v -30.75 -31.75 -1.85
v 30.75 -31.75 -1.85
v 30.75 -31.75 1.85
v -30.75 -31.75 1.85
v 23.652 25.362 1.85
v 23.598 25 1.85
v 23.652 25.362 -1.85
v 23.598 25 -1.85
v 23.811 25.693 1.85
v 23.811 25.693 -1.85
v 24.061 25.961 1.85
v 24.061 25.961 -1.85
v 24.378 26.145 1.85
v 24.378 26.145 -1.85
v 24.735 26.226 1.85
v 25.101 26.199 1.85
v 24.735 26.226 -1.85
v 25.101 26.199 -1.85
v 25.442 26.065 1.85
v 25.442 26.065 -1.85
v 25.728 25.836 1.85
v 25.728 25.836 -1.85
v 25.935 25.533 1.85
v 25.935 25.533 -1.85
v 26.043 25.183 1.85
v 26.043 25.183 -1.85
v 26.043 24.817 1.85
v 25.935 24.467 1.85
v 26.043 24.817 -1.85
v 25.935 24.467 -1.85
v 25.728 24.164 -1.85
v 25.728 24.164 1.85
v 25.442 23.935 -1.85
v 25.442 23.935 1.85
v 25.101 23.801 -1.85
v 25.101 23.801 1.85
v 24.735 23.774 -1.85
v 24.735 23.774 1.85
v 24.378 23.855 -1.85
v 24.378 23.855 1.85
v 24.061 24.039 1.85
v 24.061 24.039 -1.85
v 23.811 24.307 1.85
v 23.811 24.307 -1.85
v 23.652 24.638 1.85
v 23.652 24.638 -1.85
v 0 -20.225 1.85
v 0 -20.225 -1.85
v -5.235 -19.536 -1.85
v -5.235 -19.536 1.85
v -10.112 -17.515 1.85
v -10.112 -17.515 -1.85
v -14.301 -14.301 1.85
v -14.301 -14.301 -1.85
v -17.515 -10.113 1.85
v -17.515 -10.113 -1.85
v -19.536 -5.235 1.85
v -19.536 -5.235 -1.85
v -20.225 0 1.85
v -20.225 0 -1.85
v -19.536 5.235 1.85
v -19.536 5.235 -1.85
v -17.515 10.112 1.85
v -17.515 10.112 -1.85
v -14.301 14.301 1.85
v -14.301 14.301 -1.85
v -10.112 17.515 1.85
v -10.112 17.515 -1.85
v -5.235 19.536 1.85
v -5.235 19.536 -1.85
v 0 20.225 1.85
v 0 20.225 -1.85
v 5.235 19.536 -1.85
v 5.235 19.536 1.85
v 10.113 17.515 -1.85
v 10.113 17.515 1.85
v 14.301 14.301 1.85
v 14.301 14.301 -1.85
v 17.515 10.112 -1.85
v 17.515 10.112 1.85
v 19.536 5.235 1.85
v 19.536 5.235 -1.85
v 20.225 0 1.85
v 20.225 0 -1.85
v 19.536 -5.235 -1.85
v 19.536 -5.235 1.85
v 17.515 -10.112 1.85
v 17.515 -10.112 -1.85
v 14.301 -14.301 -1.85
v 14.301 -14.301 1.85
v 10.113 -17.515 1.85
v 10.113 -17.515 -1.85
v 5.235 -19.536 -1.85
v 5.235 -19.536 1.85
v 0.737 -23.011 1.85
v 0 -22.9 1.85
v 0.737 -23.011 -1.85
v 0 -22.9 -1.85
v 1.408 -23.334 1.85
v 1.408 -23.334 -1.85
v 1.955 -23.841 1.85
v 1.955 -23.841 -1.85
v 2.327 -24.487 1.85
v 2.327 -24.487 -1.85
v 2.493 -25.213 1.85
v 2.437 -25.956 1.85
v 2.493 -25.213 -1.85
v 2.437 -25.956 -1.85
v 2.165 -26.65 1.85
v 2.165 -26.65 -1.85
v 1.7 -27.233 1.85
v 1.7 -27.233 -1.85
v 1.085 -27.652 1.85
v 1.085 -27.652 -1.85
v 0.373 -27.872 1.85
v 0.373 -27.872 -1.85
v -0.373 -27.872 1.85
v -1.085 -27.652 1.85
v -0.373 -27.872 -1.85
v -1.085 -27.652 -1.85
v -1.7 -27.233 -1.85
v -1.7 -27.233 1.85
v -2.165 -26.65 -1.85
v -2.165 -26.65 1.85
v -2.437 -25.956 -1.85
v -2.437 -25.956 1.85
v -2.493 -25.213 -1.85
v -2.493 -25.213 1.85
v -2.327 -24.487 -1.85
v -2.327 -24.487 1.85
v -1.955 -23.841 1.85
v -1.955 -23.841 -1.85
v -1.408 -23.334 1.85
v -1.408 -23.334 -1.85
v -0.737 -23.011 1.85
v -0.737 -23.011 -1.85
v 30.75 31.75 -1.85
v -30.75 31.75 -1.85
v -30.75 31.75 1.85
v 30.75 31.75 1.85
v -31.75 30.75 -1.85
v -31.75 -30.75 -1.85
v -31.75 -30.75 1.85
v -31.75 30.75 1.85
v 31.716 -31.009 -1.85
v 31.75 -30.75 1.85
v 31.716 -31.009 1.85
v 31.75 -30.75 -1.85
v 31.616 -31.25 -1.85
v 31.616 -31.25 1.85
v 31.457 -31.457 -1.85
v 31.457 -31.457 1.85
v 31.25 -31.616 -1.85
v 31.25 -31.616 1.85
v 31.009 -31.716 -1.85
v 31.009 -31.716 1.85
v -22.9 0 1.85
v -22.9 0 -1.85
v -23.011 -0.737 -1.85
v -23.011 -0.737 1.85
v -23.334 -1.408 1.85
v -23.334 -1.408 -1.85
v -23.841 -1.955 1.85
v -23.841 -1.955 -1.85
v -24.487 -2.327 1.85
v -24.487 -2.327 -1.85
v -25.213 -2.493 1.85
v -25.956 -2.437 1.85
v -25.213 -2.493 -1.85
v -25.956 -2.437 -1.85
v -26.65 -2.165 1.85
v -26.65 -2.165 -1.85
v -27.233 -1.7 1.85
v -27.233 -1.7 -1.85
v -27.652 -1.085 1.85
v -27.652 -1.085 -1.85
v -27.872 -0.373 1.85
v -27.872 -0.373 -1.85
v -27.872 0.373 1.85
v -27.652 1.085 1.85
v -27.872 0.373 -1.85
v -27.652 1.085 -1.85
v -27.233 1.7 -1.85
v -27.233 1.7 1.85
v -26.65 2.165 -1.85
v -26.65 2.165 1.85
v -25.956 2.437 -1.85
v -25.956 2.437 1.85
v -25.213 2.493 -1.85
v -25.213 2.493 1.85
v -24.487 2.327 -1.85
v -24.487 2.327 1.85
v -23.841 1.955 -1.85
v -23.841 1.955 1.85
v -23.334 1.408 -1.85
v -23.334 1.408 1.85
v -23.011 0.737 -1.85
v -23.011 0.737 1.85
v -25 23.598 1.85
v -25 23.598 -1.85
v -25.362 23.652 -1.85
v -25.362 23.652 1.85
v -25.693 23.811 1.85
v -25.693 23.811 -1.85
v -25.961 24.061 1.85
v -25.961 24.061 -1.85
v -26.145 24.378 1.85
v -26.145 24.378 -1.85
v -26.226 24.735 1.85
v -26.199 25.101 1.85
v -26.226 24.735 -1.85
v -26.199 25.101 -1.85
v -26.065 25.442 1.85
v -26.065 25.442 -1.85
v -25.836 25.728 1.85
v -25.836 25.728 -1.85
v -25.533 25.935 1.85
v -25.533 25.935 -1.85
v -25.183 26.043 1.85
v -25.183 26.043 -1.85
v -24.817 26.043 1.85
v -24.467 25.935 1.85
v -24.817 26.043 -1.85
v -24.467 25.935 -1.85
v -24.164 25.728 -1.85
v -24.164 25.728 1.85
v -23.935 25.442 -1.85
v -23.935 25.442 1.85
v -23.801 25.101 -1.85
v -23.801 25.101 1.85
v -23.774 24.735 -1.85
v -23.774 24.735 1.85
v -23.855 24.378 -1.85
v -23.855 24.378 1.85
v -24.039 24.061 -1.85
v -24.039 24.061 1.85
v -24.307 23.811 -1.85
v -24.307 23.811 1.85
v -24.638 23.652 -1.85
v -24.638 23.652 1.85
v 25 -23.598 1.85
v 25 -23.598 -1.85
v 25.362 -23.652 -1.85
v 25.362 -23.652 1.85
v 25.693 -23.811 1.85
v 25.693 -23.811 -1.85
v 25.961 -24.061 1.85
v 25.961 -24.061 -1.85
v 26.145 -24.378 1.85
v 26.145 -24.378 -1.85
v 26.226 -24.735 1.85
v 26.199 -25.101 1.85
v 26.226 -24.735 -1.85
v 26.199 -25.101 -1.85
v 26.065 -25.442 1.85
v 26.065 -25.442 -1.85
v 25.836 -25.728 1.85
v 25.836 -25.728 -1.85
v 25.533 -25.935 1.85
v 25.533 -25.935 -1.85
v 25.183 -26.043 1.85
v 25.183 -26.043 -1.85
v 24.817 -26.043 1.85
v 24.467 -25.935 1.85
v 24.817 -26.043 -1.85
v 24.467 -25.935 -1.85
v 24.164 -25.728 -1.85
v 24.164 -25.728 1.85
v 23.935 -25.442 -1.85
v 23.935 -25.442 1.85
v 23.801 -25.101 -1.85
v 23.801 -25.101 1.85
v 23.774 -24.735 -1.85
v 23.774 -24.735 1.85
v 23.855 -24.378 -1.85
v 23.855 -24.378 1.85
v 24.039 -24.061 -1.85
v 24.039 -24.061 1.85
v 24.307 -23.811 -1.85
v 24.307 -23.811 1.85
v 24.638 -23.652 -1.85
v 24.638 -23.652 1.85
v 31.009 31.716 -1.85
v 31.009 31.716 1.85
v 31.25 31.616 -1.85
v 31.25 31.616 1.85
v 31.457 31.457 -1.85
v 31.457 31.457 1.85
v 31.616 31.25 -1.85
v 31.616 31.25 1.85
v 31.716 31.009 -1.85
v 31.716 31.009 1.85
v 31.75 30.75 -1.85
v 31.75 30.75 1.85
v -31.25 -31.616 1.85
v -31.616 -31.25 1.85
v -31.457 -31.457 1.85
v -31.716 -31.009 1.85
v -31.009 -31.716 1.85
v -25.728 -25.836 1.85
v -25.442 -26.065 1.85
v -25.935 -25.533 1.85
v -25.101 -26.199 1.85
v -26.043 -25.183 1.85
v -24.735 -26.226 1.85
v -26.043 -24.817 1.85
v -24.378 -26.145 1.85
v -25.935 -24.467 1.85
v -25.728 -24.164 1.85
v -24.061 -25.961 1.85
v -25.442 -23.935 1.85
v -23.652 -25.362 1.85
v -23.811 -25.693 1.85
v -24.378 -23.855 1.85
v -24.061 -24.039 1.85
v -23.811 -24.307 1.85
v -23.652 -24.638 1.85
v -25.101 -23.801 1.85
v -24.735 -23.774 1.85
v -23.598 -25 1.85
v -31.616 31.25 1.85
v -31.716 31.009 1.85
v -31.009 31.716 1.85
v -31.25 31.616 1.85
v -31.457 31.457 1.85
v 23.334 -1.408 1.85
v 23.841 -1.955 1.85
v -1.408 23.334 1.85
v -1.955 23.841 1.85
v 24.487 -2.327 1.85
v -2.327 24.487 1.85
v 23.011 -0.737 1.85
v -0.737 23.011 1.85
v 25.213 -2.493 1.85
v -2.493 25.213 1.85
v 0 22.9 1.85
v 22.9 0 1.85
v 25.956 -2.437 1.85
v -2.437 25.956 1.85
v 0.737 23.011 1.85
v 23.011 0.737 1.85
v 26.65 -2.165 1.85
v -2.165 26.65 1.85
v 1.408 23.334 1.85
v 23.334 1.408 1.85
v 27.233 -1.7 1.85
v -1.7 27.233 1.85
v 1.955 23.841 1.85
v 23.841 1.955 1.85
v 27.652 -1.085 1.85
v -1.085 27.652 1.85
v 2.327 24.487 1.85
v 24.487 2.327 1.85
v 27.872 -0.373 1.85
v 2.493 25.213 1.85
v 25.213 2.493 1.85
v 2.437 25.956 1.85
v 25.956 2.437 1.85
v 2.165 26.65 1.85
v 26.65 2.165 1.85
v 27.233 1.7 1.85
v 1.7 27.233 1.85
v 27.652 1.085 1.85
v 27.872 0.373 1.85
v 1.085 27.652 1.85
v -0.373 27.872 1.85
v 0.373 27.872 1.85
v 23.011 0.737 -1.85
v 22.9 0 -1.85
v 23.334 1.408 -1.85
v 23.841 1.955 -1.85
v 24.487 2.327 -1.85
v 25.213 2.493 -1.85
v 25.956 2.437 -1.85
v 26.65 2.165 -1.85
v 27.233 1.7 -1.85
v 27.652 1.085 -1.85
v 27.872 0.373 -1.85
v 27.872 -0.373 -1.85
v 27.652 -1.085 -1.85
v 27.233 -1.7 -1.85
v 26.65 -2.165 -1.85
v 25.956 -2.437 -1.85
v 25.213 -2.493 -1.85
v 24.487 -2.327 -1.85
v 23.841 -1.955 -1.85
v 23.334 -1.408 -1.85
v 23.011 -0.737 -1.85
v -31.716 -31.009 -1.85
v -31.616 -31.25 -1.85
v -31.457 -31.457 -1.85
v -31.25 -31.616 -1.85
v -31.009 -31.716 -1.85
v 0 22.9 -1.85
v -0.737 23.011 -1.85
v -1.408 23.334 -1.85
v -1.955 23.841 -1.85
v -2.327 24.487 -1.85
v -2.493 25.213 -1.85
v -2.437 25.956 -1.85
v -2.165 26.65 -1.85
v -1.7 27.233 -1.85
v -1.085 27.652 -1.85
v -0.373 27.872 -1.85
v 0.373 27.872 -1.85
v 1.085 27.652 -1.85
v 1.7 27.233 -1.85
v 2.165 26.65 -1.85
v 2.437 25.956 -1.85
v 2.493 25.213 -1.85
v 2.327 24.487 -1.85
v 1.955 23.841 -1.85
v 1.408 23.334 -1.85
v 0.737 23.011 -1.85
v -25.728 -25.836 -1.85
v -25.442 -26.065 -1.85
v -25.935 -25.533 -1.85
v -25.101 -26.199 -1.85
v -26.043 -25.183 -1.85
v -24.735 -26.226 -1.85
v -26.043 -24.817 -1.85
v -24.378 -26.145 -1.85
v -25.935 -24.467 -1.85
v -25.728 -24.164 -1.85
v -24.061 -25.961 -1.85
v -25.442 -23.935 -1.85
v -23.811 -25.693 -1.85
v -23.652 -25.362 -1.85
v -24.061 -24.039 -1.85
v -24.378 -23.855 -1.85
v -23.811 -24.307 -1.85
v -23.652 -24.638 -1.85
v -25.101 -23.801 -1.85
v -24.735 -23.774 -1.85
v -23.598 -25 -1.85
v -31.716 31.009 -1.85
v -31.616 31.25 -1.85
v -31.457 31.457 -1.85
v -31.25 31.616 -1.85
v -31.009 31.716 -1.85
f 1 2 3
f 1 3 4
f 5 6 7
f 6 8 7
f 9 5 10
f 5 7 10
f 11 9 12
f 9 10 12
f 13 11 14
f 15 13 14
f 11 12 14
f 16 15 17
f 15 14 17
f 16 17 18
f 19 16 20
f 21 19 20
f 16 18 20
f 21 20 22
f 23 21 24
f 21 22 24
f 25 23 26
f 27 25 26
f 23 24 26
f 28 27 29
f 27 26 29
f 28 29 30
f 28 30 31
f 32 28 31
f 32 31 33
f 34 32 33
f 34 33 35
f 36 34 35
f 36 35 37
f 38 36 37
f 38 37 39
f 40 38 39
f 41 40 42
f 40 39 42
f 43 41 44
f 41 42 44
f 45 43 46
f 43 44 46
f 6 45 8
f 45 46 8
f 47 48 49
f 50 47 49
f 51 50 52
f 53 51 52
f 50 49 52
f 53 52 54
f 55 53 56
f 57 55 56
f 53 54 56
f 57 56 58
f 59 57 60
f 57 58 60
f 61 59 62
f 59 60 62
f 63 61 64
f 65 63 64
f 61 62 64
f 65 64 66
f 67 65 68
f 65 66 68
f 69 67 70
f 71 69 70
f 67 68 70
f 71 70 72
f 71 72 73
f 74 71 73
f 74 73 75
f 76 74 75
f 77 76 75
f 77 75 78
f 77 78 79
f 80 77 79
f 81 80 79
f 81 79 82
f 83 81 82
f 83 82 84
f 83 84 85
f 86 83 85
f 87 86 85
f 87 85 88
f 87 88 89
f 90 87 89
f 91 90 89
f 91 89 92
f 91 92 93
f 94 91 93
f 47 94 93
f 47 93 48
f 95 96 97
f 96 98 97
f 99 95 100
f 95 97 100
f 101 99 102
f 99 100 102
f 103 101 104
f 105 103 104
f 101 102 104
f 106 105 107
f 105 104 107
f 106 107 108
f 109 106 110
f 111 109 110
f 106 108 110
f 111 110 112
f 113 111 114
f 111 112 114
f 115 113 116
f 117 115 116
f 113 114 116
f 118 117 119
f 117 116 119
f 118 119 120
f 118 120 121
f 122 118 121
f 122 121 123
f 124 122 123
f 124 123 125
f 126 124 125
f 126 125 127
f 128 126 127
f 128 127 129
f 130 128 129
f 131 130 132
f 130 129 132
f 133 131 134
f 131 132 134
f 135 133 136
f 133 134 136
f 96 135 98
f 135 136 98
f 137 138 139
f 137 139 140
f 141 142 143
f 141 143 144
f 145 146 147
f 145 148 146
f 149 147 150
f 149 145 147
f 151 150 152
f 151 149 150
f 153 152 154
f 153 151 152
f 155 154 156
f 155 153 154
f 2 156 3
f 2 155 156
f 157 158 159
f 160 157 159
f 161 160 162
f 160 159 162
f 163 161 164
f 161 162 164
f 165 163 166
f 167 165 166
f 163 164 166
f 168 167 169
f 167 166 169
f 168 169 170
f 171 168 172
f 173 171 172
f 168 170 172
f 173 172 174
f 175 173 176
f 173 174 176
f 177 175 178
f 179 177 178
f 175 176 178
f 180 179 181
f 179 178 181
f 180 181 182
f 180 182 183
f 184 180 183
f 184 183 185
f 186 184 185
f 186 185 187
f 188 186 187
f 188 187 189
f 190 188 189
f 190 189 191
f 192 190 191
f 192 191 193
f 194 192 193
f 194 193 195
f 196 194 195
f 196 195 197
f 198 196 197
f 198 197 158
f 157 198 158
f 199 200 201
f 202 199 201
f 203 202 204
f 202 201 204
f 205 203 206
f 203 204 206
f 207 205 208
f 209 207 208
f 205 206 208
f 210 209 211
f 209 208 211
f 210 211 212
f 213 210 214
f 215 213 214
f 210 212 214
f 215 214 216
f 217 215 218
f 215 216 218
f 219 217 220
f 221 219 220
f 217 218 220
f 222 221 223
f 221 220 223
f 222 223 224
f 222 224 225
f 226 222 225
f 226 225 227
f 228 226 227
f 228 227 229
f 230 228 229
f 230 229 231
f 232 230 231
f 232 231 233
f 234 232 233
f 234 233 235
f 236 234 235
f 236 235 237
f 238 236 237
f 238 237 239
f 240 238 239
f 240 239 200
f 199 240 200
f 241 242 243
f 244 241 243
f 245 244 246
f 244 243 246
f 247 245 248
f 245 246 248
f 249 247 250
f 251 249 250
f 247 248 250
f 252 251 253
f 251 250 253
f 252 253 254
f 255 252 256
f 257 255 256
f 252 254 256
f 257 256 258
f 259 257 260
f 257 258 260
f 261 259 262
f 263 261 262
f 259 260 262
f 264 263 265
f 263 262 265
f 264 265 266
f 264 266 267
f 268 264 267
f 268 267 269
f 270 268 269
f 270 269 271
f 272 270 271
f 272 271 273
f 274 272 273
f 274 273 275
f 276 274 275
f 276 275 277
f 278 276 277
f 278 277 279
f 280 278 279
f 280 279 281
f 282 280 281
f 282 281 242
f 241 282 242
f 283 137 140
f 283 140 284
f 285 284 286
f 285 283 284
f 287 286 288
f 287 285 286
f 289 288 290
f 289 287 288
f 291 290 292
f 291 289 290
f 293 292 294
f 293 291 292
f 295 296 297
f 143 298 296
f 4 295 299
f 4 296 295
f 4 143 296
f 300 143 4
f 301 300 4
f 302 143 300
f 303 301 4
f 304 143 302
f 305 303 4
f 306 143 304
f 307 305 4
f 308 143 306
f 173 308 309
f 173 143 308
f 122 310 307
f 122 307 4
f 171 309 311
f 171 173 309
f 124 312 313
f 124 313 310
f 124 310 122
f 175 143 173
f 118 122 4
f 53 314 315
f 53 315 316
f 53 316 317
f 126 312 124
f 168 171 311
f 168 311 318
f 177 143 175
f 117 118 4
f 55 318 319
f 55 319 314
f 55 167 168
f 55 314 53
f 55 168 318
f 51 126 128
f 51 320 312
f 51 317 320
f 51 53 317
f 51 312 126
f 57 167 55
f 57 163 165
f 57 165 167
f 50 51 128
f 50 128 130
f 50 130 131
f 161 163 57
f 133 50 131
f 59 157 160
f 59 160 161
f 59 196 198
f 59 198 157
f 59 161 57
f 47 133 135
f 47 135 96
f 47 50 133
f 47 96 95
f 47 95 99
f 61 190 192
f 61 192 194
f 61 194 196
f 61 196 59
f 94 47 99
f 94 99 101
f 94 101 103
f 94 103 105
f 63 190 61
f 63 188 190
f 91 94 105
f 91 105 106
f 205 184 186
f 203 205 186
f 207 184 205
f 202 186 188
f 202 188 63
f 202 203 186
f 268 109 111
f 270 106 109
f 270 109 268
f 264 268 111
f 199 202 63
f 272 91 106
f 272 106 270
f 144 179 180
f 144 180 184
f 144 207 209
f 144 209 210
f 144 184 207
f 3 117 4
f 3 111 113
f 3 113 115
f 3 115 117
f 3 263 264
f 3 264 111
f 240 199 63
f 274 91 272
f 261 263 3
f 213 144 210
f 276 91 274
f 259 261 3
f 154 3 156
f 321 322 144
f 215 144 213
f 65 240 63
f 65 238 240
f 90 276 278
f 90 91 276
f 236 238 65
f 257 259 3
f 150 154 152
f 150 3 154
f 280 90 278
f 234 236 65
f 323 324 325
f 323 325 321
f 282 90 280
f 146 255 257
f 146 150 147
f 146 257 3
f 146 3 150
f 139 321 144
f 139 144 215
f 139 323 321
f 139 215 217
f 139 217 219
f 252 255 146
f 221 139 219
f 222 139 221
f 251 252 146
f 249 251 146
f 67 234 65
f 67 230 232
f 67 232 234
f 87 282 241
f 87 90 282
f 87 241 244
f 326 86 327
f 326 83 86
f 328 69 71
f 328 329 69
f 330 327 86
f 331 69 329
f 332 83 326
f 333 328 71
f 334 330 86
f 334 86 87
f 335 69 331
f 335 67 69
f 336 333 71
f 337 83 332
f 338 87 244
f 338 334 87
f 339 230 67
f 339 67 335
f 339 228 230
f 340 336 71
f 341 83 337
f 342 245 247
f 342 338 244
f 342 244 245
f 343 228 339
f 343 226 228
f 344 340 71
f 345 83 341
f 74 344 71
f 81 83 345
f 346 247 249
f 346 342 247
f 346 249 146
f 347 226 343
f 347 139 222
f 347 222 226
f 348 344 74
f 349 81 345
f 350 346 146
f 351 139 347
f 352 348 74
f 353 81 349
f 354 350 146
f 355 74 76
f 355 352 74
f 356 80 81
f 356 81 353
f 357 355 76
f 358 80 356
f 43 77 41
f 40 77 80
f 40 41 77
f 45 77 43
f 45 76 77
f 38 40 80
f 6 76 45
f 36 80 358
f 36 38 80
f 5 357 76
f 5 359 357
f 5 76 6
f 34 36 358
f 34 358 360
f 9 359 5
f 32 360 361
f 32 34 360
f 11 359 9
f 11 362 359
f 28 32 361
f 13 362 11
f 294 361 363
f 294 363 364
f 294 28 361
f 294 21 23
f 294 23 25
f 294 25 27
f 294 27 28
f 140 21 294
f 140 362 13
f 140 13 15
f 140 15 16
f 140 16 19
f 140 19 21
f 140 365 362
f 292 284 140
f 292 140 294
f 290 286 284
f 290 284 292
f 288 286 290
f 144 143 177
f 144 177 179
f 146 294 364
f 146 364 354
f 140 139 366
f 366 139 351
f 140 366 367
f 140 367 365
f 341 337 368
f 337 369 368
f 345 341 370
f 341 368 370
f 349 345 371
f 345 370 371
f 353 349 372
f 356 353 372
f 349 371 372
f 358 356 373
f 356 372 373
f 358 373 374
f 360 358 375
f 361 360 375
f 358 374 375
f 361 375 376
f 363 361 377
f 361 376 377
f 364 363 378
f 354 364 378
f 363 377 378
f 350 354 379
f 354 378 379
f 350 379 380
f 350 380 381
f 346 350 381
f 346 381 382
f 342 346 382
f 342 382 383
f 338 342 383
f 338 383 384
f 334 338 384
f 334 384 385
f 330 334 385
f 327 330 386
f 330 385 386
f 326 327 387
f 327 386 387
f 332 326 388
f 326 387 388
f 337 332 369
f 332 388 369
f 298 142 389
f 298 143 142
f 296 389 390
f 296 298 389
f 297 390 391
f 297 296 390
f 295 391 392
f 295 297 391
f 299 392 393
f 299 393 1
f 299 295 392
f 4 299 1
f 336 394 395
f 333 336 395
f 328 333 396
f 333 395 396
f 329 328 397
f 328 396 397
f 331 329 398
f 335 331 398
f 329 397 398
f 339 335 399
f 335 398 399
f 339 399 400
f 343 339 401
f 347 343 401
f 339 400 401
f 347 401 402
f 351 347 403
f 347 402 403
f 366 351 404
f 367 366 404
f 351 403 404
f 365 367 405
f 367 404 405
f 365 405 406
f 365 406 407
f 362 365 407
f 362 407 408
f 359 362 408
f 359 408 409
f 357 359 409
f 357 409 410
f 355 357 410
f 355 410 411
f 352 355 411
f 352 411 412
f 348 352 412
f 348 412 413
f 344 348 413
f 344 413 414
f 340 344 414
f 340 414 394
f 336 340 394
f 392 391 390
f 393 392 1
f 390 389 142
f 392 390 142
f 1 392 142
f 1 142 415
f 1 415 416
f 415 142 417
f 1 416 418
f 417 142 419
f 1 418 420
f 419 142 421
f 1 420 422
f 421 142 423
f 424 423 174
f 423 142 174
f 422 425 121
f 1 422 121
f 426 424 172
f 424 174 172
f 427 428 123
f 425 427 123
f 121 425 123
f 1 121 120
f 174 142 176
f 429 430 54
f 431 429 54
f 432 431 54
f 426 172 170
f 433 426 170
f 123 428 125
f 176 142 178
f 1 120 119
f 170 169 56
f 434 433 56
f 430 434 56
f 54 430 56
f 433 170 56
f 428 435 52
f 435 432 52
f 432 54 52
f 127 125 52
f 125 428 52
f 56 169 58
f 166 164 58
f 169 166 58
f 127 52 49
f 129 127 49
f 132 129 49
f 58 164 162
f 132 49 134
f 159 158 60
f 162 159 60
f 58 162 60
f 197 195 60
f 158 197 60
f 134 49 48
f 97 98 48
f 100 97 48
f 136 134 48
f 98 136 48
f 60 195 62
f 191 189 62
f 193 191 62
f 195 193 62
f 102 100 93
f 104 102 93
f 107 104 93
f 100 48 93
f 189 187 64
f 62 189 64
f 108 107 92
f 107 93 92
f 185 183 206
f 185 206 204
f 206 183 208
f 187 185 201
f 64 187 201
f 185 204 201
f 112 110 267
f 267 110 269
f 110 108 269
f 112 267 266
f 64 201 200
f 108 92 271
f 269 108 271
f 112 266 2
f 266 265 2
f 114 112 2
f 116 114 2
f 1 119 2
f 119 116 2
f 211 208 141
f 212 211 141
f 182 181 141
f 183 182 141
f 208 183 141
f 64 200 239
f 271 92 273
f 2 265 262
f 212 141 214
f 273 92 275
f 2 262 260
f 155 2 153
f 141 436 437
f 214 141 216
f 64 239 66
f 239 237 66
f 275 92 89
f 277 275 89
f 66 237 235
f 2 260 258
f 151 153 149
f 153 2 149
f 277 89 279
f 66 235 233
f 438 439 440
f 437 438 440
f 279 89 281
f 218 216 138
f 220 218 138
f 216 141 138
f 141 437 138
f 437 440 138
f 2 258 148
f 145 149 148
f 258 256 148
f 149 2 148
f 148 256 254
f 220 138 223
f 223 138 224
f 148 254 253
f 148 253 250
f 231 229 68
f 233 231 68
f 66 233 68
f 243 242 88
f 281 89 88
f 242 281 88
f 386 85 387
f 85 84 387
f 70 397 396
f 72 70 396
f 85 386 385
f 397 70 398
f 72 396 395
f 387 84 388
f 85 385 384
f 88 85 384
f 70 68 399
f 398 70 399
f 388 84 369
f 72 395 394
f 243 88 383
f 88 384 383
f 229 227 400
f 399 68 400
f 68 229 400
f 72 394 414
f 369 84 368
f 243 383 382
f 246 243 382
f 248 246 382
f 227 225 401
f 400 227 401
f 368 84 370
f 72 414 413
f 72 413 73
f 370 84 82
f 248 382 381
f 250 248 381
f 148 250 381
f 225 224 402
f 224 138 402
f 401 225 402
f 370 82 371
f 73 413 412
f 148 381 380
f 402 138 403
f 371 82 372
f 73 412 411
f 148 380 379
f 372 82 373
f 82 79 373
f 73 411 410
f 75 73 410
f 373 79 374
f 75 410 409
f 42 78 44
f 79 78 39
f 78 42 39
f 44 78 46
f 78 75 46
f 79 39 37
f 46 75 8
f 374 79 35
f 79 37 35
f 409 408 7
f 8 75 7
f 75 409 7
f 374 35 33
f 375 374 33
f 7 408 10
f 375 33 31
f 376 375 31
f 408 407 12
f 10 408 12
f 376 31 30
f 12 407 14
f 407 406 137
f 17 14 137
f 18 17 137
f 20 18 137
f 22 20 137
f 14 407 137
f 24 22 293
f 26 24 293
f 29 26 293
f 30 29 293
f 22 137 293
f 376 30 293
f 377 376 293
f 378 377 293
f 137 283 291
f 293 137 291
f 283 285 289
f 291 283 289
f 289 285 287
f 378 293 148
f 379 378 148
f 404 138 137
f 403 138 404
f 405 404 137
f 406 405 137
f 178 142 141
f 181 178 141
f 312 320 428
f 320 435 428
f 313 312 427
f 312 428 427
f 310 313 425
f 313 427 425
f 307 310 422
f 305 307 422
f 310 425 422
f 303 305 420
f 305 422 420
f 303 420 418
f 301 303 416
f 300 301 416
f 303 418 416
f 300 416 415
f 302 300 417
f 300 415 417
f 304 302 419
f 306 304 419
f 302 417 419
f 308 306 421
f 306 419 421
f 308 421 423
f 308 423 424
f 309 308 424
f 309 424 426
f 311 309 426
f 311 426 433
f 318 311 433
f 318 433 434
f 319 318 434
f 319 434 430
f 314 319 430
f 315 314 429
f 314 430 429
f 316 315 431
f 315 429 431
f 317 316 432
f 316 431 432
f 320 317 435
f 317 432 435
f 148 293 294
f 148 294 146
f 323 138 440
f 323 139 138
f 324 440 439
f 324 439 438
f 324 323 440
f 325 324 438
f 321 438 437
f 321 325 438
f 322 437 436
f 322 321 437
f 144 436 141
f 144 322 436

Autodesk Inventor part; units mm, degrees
ref_plane "YZ Plane" through (0, 0, 0) normal (1, 0, 0) x (0, 1, 0)
ref_plane "XZ Plane" through (0, 0, 0) normal (0, 1, 0) x (-1, 0, 0)
ref_plane "XY Plane" through (0, 0, 0) normal (0, 0, 1) x (1, 0, 0)
sketch "Sketch1" plane through (0, 0, 0) normal (0, 0, 1) x (1, 0, 0)
  line L0 (-31.75, 31.75) -> (31.75, 31.75)
  line L1 (31.75, 31.75) -> (31.75, -31.75)
  line L2 (31.75, -31.75) -> (-31.75, -31.75)
  line L3 (-31.75, -31.75) -> (-31.75, 31.75)
  line L4 (0, 0) -> (31.75, 0) construction
  line L5 (0, 0) -> (-31.75, 0) construction
  line L6 (0, 0) -> (0, 31.75) construction
  line L7 (0, 0) -> (0, -31.75) construction
  dimension "d0" = 63.5
  dimension "d1" = 63.5
extrude "Extrusion1" add sketch "Sketch1" along normal mid plane 3.7
sketch "Sketch2" plane through (0, 0, 1.85) normal (0, 0, 1) x (1, 0, 0)
  point P0 (0, 0)
hole "Hole1" at (0, 0, 1.85) direction (0, 0, -1) diameter 40.45 end through all
sketch "Sketch3" plane through (0, 0, 1.85) normal (0, 0, 1) x (1, 0, 0)
  circle A0 centre (0, 0) radius 20.225 projected
  point P0 (0, 25.4)
  dimension "d11" = 25.4
hole "Hole2" at (0, 25.4, 1.85) direction (0, 0, -1) diameter 5 end through all
pattern_circular "Circular Pattern1" count 4 over 360 about axis through (0, 0, -88.0288) along (0, 0, 1) of "Hole2"
sketch "Sketch4" plane through (0, 0, 1.85) normal (0, 0, 1) x (1, 0, 0)
  circle A0 centre (-25.4, 0) radius 2.5 projected
  circle A1 centre (0, 25.4) radius 2.5 projected
  point P0 (-25, 24.8272)
  dimension "d24" = 24.8272
  dimension "d25" = 25
hole "Hole3" at (-25, 24.8272, 1.85) direction (0, 0, -1) diameter 2.459 end through all thread size "M3x0.5" class "6H" standard "ANSI Metric M Profile"
pattern_circular "Circular Pattern2" count 4 over 360 about axis through (0, 0, -88.0288) along (0, 0, 1) of "Hole3"
fillet "Fillet1" radius 1 4 edges at (-31.75, 31.75, 0) (-31.75, -31.75, 0) (31.75, -31.75, 0) (31.75, 31.75, 0)
properties part number "BB2-InterfacePlate" material "Aluminum-6061"
